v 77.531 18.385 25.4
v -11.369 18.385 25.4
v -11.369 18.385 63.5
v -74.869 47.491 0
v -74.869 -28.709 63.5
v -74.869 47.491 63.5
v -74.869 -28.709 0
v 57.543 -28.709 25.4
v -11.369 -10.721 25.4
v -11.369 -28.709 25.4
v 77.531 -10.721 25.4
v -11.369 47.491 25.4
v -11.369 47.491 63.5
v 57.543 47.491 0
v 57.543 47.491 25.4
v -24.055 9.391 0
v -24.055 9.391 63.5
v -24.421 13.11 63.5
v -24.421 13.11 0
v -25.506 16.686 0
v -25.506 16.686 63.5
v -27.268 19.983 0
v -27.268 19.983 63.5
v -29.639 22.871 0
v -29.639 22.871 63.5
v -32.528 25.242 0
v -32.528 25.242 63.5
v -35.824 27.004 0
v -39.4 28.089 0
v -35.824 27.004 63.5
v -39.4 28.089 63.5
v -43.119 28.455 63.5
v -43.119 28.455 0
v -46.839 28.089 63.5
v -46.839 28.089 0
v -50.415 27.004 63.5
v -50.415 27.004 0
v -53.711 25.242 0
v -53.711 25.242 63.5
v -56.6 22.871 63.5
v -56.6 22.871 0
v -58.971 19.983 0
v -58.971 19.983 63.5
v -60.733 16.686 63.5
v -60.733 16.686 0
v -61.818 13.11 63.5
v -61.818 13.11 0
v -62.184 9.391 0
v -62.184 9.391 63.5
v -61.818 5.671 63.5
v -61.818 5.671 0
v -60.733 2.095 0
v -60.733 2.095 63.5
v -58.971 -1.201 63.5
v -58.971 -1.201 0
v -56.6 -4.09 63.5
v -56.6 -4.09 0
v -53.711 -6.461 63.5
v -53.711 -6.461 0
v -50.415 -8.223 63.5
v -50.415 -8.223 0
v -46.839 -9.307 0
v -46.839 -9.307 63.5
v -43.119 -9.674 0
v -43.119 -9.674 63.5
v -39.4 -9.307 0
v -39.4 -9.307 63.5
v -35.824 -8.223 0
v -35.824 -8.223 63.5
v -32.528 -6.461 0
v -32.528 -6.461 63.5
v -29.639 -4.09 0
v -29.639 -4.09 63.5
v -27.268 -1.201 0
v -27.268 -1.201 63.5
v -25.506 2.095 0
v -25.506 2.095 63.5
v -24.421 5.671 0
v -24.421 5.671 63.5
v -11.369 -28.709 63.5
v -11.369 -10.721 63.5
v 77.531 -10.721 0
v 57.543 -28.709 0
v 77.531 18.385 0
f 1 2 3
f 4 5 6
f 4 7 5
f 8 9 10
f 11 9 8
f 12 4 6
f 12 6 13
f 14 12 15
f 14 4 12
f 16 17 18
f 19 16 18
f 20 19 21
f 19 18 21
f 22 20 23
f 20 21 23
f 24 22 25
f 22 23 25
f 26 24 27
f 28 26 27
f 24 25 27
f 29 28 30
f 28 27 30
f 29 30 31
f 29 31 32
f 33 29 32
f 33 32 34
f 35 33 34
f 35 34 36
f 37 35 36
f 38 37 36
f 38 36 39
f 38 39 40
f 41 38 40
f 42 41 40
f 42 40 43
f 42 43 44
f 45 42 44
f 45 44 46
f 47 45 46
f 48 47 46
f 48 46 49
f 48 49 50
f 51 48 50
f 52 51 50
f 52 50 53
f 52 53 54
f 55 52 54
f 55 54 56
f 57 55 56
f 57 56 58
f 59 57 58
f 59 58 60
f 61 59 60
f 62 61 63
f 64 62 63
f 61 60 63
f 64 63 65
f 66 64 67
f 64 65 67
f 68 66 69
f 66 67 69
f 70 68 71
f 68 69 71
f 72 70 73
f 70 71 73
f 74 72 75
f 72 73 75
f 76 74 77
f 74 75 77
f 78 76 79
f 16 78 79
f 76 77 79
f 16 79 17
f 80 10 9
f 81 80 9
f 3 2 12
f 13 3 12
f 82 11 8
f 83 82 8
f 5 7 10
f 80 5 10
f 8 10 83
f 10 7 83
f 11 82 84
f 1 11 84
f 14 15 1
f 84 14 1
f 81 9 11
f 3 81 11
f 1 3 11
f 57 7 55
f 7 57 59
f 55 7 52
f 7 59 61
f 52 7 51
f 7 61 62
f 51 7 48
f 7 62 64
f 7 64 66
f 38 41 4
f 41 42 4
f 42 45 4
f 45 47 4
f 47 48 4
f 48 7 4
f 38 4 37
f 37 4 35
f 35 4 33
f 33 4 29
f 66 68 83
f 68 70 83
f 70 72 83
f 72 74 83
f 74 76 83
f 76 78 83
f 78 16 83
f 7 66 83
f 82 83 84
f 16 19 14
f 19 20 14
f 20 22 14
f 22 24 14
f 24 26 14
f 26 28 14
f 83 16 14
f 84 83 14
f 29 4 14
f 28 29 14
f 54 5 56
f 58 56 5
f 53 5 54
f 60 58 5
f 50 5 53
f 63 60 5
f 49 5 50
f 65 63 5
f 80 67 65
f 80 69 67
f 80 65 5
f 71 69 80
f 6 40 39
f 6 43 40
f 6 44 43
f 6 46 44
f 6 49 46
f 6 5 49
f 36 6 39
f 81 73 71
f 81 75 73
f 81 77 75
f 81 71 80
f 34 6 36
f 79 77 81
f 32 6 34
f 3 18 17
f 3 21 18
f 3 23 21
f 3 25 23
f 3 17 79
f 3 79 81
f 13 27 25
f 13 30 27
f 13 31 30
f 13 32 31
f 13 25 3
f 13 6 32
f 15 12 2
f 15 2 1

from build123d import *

# Parameters (mm, degrees)
F0_W      = 152.4
F0_H      = 76.2
F1_DEPTH  = 25.4
F2_W      = 63.5
F2_H      = 76.2
F3_DEPTH  = 38.1
F5_DEPTH  = 25.4
F7_DEPTH  = 25.4
F8_W      = 88.9
F8_H      = 29.105824
F9_DEPTH  = 38.1
F11_DEPTH = 38.1
F12_R     = 19.064579
F13_DEPTH = 76.2


with BuildPart() as f1:
    # F0 (on Top) → F1 (new body)
    with BuildSketch(Plane.XY):
        with Locations((1.330726, 9.390795)):
            Rectangle(F0_W, F0_H)
    extrude(amount=F1_DEPTH)

    # F2 (on face) → F3 (join)
    with BuildSketch(Plane.XY.offset(25.4)):
        with Locations((-43.119274, 9.390795)):
            Rectangle(F2_W, F2_H)
    extrude(amount=F3_DEPTH)

    # F4 (on face) → F5 (cut)
    with BuildSketch(Plane.XY.offset(25.4)):
        Polygon((57.543479, -28.709205), (77.530726, -28.709205), (77.530726, -10.720854), align=None)
    extrude(amount=-F5_DEPTH, mode=Mode.SUBTRACT)

    # F6 (on face) → F7 (cut)
    with BuildSketch(Plane.XY.offset(25.4)):
        Polygon((77.530726, 47.490795), (57.543479, 47.490795), (77.530726, 18.38497), align=None)
    extrude(amount=-F7_DEPTH, mode=Mode.SUBTRACT)

    # F8 (on face) → F9 (join)
    with BuildSketch(Plane.XY.offset(25.4)):
        with Locations((33.080726, 3.832058)):
            Rectangle(F8_W, F8_H)
    extrude(amount=F9_DEPTH)

    # F10 (on face) → F11 (cut)
    with BuildSketch(Plane.XZ.offset(10.720854)):
        Polygon((77.530726, 63.5), (-11.369274, 63.5), (77.530726, 25.4), align=None)
    extrude(amount=-F11_DEPTH, mode=Mode.SUBTRACT)

    # F12 (on face) → F13 (cut)
    with BuildSketch(Plane.XY.offset(63.5)):
        with Locations((-43.119274, 9.390795)):
            Circle(F12_R)
    extrude(amount=-F13_DEPTH, mode=Mode.SUBTRACT)


solid = f1.part
